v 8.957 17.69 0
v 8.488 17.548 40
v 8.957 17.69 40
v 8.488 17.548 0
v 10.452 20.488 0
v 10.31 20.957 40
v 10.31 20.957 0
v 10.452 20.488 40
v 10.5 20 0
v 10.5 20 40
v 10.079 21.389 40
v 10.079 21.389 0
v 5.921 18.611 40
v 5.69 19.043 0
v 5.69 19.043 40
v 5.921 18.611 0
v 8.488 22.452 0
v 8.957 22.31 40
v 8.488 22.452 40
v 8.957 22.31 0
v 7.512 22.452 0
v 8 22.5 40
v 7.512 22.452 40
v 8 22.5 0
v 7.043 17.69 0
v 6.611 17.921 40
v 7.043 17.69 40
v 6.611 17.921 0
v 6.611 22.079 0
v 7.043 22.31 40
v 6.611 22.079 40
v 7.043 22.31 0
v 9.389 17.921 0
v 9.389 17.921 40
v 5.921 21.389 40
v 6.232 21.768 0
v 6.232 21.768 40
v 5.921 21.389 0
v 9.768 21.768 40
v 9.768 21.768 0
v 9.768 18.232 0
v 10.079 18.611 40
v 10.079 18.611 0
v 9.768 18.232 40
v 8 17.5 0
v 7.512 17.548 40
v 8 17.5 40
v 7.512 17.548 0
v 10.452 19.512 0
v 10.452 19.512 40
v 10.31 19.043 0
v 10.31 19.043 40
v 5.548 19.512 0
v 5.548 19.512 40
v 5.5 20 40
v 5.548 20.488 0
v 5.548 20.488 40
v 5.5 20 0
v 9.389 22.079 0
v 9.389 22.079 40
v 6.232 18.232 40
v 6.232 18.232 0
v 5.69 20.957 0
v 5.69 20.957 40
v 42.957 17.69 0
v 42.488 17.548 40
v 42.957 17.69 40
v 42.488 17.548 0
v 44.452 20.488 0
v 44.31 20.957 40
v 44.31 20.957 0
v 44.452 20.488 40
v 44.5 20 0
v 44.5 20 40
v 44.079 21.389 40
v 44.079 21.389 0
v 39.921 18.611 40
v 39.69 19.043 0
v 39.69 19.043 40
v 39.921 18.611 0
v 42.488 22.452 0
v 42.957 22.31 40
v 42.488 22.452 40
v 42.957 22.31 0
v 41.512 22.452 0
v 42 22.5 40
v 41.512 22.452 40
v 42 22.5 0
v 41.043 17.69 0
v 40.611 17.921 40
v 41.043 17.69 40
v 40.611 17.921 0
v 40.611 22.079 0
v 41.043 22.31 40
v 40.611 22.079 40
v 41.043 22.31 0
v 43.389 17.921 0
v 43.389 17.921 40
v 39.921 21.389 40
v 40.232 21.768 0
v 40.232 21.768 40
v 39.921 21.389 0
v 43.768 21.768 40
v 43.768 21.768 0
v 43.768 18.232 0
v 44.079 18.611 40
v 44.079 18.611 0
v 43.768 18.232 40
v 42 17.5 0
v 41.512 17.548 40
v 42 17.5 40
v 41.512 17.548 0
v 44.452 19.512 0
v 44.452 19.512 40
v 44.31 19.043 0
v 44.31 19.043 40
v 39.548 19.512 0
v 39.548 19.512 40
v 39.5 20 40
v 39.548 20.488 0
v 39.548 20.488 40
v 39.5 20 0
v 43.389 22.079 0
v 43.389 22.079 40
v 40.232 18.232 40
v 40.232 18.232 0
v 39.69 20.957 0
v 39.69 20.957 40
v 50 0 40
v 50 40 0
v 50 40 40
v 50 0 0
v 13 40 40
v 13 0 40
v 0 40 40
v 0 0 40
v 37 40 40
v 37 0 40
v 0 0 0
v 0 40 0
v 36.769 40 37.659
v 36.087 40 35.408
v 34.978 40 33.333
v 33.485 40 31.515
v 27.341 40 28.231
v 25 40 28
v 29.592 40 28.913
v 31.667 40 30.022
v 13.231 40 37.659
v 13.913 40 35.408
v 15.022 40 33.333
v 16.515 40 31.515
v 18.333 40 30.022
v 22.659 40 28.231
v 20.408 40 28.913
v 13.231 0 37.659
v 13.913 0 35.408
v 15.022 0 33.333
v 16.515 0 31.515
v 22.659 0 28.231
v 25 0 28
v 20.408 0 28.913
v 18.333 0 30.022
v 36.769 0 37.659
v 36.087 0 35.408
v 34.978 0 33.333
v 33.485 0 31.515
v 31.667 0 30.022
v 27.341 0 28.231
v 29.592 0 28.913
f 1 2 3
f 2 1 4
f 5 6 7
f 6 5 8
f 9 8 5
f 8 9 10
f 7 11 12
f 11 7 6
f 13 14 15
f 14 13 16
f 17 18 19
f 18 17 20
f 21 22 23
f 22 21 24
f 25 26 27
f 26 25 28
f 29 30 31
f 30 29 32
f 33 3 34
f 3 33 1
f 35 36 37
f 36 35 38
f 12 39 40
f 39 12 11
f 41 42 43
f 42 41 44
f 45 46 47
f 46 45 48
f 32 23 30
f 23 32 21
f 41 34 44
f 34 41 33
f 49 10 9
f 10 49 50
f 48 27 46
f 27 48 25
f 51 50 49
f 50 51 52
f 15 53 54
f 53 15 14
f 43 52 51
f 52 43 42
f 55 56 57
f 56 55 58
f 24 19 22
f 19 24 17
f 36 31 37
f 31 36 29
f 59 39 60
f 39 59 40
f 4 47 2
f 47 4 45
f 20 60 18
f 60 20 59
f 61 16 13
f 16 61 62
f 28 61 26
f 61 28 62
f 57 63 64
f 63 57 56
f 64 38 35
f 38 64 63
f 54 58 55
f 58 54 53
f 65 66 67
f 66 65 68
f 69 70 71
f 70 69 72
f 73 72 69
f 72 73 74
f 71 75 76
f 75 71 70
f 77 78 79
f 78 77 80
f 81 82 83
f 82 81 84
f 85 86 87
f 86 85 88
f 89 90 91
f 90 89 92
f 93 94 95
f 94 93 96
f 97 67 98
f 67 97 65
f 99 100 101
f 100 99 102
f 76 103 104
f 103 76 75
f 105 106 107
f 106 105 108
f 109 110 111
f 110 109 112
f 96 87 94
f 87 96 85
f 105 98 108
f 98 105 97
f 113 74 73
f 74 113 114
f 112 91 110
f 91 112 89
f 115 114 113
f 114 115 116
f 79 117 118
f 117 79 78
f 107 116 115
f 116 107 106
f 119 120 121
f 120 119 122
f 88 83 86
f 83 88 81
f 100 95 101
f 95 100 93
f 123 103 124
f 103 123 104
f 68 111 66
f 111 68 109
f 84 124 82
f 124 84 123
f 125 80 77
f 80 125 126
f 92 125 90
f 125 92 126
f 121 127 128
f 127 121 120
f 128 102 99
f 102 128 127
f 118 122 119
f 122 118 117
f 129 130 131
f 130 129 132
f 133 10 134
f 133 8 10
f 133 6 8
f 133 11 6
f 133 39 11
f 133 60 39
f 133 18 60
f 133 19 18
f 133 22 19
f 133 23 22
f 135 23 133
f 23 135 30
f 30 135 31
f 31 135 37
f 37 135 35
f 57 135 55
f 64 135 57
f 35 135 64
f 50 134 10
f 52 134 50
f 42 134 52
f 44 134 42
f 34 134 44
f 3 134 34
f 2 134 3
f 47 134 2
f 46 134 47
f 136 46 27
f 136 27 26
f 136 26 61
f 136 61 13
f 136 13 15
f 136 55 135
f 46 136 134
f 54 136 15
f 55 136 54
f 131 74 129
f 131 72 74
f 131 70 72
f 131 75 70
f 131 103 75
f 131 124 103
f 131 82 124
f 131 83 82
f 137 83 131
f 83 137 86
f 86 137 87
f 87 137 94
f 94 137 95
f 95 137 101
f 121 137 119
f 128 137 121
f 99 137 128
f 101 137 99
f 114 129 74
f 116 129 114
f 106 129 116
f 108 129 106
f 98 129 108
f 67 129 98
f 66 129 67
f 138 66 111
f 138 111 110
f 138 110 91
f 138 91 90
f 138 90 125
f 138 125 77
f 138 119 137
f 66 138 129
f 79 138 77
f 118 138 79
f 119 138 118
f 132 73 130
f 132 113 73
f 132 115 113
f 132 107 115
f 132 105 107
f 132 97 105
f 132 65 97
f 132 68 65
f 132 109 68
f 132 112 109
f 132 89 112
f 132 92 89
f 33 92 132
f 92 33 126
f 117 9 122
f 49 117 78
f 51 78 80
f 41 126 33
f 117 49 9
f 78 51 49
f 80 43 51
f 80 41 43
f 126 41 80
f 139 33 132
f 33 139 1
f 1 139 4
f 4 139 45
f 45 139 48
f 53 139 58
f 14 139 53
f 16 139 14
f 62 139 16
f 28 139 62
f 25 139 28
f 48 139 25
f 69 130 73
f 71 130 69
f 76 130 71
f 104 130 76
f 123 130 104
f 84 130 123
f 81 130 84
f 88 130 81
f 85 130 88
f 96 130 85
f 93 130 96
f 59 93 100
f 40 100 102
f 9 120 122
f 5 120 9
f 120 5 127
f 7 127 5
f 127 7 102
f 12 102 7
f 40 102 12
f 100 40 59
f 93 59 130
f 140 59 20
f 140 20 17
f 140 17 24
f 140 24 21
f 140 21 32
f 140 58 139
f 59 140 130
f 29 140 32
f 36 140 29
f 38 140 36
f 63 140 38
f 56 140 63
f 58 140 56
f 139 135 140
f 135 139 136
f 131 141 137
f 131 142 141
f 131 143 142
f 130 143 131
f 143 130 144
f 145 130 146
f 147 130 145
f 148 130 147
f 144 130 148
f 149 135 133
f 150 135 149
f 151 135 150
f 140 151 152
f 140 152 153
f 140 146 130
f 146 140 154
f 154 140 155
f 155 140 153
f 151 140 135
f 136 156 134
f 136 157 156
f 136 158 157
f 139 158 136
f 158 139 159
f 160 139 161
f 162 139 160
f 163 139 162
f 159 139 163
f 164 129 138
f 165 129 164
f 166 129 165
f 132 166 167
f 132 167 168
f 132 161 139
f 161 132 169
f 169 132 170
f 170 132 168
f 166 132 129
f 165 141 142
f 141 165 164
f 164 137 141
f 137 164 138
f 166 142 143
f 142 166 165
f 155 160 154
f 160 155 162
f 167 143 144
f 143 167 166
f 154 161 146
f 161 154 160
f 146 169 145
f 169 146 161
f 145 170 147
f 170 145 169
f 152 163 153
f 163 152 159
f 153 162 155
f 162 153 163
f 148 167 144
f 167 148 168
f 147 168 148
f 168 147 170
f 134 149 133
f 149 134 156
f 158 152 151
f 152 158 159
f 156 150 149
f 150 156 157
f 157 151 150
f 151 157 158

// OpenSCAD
$fn = 32;

// ----------------------------------------------------------------------
// Saddle clamp: plain shaft clamp
// ----------------------------------------------------------------------

// --- parameters (mm) ---
blk_l = 50;               // block length, X
blk_w = 40;               // block width, Y
blk_h = 40;               // block height
clamp_r = 12;             // shaft groove radius
hole_r = 2.5;             // bolt hole radius
hole_m = 8;               // bolt hole margin from the ends

saw_depth = clamp_r + 3;  // saw kerf depth

difference() {
  cube([blk_l, blk_w, blk_h]);
  translate([blk_l / 2, -1, blk_h])
    rotate([-90, 0, 0])
      cylinder(h = blk_w + 2, r = clamp_r);
  for (sx = [0, 1])
    translate([sx ? blk_l - hole_m : hole_m, blk_w / 2, -1])
      cylinder(r = hole_r, h = blk_h + 2);
}
